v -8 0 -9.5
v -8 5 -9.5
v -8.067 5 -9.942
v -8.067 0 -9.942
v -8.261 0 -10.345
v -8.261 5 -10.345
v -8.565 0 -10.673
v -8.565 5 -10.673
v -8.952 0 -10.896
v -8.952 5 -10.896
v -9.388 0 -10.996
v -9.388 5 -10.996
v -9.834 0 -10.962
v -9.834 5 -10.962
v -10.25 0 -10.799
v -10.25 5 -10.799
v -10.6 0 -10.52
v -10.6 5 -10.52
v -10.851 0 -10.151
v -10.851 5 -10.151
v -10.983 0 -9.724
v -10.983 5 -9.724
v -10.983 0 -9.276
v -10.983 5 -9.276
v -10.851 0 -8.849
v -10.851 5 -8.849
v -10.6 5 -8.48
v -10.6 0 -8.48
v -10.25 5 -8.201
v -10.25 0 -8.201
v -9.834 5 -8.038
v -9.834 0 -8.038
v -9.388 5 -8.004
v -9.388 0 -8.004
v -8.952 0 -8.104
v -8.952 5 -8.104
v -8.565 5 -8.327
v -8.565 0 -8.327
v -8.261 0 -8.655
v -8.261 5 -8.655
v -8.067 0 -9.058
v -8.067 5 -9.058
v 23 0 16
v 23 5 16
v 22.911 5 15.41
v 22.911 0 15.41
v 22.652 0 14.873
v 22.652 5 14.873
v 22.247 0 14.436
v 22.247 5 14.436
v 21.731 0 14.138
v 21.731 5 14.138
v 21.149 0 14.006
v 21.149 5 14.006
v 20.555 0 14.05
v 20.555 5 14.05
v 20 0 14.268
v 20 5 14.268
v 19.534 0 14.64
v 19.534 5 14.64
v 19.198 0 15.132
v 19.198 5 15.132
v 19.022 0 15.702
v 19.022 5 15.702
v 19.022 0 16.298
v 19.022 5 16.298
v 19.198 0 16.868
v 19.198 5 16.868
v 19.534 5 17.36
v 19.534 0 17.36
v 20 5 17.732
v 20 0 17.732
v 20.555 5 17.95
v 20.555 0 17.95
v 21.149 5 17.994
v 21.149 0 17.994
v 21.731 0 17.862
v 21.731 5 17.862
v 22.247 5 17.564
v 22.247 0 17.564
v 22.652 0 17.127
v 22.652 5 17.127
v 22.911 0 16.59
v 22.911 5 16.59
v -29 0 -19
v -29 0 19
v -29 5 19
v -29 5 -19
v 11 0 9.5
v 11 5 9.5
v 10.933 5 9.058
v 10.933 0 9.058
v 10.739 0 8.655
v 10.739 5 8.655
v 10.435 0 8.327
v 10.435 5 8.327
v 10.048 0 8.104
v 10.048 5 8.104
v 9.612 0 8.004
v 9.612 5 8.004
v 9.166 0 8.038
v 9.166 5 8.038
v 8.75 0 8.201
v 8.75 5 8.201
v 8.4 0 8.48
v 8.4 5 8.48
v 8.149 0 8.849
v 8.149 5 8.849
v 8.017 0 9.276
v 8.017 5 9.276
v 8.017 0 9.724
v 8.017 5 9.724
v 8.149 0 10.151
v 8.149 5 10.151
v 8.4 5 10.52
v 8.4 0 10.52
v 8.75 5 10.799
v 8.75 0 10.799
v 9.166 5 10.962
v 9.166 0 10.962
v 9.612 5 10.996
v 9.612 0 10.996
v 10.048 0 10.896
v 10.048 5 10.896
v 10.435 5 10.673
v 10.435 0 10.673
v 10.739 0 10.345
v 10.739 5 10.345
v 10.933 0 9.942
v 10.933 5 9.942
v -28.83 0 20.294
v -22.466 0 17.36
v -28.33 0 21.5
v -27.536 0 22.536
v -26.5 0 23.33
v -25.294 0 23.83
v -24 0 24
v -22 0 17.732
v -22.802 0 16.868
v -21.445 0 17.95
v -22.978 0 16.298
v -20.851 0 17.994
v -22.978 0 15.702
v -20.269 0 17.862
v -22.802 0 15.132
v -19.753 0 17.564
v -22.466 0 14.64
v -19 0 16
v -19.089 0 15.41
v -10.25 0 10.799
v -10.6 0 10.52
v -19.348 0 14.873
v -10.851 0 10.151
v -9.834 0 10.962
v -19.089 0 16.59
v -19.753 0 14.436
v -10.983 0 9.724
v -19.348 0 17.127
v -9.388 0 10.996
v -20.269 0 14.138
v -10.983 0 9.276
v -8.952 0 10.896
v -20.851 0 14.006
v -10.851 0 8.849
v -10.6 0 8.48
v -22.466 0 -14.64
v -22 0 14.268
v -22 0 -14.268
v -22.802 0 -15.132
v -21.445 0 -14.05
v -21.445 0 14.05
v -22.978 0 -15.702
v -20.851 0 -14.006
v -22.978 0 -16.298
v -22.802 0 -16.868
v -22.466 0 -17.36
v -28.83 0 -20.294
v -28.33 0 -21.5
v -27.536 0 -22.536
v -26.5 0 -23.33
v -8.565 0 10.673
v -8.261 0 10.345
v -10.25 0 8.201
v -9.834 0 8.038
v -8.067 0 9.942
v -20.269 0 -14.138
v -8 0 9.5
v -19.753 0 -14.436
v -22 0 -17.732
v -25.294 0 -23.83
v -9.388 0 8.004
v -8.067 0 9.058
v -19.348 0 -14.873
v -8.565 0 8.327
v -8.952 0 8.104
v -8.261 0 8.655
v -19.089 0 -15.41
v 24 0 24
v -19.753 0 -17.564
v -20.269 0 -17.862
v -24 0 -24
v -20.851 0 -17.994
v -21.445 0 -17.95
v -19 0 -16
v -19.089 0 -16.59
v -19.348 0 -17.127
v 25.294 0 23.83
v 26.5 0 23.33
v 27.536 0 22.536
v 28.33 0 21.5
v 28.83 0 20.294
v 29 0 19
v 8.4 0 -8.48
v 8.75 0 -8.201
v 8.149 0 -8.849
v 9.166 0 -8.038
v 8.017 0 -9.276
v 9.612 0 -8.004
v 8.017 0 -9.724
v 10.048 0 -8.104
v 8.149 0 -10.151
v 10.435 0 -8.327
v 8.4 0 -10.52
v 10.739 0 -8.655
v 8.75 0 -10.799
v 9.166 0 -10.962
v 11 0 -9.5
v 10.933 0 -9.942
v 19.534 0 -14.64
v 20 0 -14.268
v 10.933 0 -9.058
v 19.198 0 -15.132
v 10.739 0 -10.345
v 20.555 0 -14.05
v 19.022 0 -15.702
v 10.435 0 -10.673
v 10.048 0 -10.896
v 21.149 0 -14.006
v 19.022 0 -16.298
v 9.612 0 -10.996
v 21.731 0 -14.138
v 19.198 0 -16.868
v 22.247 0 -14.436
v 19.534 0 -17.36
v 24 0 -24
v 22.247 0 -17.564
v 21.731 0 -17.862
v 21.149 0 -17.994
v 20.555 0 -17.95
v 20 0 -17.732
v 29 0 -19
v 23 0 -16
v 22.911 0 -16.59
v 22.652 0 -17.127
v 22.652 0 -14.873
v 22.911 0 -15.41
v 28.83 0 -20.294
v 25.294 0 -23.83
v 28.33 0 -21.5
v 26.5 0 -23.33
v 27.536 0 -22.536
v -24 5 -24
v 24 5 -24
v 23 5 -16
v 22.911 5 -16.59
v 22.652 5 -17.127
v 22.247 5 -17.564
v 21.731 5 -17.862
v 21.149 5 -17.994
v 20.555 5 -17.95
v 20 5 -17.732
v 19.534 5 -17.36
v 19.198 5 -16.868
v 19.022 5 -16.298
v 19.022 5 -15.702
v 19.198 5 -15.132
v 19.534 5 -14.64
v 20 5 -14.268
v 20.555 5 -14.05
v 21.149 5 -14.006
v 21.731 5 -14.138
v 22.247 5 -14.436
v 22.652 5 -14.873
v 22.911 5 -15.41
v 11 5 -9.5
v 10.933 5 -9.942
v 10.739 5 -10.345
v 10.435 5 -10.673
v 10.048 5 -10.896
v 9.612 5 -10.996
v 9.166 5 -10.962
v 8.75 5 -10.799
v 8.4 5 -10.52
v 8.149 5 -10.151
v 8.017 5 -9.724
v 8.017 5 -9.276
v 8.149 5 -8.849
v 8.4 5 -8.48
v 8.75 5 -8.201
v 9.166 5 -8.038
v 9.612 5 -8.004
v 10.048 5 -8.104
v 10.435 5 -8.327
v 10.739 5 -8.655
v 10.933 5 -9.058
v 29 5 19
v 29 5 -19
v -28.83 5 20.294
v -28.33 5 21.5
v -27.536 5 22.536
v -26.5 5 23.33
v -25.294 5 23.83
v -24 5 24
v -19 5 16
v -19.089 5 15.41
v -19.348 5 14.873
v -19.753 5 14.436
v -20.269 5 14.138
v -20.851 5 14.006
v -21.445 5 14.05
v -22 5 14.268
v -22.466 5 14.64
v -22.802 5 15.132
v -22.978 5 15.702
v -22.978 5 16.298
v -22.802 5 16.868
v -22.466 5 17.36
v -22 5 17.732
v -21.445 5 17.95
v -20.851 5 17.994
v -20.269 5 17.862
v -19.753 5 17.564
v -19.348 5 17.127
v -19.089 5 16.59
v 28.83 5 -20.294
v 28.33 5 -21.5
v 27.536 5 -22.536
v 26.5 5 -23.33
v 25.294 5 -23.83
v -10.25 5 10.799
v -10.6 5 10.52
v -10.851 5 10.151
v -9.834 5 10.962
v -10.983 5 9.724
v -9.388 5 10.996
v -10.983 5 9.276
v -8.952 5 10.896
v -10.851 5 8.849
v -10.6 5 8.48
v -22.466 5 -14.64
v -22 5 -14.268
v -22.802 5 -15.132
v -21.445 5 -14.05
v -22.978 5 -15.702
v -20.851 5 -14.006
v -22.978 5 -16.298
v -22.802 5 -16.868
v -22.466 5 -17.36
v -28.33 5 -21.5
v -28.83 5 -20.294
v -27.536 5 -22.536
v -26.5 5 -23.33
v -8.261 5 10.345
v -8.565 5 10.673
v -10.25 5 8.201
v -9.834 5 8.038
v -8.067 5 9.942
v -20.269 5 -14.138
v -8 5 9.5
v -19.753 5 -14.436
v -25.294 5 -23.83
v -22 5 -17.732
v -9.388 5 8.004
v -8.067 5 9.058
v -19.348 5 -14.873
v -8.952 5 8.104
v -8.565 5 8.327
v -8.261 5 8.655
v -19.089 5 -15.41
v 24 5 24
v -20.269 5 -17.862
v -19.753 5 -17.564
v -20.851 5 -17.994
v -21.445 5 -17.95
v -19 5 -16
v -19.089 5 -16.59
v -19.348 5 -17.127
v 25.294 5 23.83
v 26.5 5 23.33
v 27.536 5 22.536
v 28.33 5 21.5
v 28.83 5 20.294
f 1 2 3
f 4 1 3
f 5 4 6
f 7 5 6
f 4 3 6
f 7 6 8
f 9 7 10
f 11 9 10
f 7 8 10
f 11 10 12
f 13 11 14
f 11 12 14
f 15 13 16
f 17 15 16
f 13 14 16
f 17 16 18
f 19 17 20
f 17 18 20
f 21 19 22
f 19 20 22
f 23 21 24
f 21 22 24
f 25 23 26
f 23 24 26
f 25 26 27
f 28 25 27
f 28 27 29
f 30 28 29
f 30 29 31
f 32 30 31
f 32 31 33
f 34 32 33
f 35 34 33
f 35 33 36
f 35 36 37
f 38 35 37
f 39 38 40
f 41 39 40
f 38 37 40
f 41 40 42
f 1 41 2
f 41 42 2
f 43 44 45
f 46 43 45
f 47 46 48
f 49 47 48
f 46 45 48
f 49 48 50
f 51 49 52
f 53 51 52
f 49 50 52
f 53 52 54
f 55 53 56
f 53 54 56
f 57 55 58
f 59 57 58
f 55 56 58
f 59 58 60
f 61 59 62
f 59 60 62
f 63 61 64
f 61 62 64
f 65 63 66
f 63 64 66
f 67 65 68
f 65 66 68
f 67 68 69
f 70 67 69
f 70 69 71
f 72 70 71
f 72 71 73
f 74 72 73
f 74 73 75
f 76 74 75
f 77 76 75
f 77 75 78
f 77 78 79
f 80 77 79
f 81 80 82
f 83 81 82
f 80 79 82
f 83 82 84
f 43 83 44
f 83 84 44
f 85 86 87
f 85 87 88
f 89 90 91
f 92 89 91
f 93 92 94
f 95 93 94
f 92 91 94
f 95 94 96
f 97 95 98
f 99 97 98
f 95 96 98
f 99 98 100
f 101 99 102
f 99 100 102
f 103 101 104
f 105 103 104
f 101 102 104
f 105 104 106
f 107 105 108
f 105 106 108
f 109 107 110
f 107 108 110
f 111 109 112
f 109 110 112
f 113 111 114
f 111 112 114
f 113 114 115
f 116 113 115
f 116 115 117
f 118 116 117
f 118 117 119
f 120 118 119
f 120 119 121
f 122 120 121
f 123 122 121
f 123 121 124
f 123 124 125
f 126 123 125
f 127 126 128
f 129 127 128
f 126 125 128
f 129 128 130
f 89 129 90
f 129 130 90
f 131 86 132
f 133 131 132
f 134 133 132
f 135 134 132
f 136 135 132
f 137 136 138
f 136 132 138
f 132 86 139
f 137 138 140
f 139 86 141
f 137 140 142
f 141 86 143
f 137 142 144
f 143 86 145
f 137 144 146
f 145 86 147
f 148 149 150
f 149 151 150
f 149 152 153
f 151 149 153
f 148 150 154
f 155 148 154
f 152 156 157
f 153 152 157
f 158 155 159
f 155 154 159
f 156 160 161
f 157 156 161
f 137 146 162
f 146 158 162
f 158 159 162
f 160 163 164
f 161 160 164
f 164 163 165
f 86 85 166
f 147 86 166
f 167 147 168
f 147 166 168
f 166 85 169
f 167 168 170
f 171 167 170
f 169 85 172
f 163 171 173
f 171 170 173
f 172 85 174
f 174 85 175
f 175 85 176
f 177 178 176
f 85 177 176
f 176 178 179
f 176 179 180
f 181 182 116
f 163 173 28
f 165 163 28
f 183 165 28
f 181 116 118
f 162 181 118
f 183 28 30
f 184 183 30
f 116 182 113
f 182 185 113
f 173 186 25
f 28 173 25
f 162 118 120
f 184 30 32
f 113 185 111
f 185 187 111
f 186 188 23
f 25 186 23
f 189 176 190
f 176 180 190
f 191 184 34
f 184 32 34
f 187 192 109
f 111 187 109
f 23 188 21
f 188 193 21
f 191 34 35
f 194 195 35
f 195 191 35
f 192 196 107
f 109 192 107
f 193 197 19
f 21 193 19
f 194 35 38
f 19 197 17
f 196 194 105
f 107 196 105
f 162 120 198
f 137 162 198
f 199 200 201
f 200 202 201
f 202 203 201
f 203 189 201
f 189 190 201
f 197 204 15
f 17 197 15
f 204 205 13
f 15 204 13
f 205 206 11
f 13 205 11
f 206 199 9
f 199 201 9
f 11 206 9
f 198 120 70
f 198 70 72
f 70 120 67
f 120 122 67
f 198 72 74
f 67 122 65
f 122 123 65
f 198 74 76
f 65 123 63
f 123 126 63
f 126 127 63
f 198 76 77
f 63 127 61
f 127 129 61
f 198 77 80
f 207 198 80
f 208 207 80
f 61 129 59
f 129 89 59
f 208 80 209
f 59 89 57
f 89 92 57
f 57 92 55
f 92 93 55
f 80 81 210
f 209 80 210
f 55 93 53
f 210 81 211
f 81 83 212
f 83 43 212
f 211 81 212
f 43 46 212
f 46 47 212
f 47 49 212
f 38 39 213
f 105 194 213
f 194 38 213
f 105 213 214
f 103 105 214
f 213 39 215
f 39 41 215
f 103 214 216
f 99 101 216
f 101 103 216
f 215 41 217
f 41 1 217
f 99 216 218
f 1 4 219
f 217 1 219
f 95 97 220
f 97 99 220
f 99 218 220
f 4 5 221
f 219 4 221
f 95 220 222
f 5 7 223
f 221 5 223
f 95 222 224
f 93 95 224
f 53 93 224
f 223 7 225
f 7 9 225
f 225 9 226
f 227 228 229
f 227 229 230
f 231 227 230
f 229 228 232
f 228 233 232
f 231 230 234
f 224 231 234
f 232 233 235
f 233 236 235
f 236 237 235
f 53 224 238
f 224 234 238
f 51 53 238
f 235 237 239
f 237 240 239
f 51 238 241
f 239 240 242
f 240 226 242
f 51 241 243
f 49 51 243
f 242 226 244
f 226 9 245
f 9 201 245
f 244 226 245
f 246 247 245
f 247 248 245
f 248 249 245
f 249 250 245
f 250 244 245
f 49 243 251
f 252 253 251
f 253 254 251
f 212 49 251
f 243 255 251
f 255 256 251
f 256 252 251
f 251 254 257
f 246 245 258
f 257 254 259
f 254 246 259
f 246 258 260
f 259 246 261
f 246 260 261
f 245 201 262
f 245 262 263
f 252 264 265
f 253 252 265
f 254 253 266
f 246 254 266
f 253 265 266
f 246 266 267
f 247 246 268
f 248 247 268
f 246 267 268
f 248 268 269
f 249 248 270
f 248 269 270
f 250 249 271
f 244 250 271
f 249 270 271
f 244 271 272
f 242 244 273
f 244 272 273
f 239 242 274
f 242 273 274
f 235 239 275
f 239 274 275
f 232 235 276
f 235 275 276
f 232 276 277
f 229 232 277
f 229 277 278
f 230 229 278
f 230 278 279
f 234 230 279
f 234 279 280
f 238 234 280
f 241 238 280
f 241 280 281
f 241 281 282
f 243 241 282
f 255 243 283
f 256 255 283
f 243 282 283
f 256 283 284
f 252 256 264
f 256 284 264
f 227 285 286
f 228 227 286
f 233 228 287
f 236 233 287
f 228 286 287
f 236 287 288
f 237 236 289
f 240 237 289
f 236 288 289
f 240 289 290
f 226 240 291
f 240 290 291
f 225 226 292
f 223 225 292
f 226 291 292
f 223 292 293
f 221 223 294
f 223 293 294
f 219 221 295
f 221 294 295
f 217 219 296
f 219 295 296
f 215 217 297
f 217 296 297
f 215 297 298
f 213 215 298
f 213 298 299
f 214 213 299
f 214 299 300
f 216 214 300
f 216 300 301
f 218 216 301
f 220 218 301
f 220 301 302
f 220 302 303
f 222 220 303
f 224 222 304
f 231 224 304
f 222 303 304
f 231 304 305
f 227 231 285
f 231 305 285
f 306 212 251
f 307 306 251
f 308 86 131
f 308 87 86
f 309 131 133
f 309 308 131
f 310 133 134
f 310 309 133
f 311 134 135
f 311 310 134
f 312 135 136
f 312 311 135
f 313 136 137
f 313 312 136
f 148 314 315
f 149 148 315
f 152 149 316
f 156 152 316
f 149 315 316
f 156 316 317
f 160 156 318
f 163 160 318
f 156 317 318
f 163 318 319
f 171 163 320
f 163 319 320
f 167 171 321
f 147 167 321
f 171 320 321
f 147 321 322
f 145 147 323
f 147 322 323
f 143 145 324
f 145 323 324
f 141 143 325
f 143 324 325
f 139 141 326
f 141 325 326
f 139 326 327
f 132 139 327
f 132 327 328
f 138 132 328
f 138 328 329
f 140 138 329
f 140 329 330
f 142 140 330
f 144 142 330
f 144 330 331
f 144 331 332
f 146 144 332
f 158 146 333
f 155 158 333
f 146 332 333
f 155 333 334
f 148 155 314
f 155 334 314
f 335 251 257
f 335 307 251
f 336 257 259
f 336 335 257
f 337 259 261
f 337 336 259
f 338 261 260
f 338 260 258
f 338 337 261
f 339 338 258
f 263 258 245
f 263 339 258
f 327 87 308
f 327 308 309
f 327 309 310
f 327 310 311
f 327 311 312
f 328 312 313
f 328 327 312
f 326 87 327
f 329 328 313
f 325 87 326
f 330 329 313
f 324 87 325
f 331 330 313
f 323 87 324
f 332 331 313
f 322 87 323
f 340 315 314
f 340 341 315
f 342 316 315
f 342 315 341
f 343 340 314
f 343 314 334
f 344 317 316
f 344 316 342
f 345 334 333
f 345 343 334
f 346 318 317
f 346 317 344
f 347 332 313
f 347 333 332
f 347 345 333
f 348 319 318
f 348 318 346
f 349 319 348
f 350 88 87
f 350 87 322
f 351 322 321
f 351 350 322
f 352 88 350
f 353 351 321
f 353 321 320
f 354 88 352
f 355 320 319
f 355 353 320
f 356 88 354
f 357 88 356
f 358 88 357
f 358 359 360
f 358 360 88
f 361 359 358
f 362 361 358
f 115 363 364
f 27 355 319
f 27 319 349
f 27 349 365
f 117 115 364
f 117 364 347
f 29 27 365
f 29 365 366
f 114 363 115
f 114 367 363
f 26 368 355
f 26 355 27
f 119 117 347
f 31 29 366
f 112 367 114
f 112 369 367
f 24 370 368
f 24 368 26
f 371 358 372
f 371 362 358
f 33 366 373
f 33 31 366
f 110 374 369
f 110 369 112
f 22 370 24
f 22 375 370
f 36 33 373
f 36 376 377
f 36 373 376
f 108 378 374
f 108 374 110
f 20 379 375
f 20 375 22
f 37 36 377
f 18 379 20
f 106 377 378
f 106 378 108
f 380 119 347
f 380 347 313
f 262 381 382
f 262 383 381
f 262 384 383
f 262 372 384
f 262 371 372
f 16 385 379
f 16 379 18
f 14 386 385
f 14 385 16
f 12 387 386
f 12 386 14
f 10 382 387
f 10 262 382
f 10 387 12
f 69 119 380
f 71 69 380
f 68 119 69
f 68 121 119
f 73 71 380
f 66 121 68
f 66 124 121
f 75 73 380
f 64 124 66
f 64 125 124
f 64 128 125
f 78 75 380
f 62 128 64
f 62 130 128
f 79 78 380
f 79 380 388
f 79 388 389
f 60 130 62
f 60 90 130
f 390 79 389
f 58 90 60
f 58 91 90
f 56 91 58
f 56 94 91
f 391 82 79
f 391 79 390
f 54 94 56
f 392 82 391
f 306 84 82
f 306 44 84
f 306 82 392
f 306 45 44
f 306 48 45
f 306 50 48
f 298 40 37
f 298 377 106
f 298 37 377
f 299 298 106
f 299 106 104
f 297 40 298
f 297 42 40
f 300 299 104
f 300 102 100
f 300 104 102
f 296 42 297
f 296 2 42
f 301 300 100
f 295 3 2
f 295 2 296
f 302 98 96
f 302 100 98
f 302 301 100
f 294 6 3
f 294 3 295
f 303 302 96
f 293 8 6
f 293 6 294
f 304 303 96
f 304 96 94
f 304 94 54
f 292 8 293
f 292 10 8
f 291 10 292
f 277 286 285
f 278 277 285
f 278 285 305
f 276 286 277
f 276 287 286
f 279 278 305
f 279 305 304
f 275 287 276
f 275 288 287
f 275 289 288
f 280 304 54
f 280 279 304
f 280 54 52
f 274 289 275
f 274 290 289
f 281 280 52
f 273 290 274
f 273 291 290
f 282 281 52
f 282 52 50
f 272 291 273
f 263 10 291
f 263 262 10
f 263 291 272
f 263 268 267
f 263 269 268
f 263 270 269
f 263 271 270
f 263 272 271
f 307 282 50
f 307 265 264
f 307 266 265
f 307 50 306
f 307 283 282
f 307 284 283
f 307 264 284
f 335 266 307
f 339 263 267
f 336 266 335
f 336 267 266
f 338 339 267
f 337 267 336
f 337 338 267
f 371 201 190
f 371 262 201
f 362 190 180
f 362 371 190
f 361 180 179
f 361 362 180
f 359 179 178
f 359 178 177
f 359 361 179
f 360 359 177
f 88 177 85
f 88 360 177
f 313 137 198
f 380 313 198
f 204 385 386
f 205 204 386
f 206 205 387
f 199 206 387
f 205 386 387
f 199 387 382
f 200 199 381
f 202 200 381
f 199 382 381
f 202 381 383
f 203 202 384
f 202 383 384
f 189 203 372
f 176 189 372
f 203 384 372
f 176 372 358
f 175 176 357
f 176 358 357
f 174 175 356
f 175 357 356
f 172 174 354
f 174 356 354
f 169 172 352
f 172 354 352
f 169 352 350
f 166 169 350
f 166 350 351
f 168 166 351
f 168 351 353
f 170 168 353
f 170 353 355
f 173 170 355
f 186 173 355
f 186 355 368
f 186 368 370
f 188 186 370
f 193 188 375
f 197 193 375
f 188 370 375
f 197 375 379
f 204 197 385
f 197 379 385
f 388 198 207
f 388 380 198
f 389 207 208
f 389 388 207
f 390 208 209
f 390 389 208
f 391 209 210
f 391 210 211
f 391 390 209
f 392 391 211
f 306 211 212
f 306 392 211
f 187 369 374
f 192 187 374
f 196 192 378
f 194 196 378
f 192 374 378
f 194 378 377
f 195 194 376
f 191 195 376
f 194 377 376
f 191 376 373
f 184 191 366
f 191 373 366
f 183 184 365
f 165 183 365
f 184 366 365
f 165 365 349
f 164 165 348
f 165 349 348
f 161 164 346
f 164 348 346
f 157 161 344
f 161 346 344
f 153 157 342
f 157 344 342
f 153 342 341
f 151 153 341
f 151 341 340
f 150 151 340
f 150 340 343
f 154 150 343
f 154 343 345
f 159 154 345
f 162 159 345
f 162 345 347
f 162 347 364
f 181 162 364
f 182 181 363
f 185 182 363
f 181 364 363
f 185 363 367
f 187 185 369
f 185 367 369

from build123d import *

# Parameters (mm, degrees)
SKETCH1_W           = 58
SKETCH1_H           = 48
BOSS_EXTRUDE1_DEPTH = 5
SKETCH2_R           = 2
SKETCH2_R_2         = 1.5
CUT_EXTRUDE1_DEPTH  = 5
FILLET1_R           = 5
FILLET2_R           = 5
FILLET3_R           = 5
FILLET4_R           = 5


with BuildPart() as part:
    # Sketch1 → Boss-Extrude1 (new body)
    with BuildSketch(Plane(origin=(0, 0, 0), x_dir=(1, 0, 0), z_dir=(0, 1, 0))):
        Rectangle(SKETCH1_W, SKETCH1_H)
    extrude(amount=BOSS_EXTRUDE1_DEPTH)

    # Sketch2 → Cut-Extrude1 (cut)
    with BuildSketch(Plane(origin=(0, 5, 0), x_dir=(1, 0, 0), z_dir=(0, 1, 0))):
        with Locations((21, -16)):
            Circle(SKETCH2_R)
        with Locations((-21, -16)):
            Circle(SKETCH2_R)
        with Locations((-21, 16)):
            Circle(SKETCH2_R)
        with Locations((21, 16)):
            Circle(SKETCH2_R)
        with Locations((9.5, -9.5)):
            Circle(SKETCH2_R_2)
        with Locations((-9.5, -9.5)):
            Circle(SKETCH2_R_2)
        with Locations((9.5, 9.5)):
            Circle(SKETCH2_R_2)
        with Locations((-9.5, 9.5)):
            Circle(SKETCH2_R_2)
    extrude(amount=-CUT_EXTRUDE1_DEPTH, mode=Mode.SUBTRACT)

    # Fillet1
    fillet1_edges = [part.edges().sort_by_distance(p)[0] for p in [
        (-29, 2.5, 24),
    ]]
    fillet(fillet1_edges, radius=FILLET1_R)

    # Fillet2
    fillet2_edges = [part.edges().sort_by_distance(p)[0] for p in [
        (29, 2.5, 24),
    ]]
    fillet(fillet2_edges, radius=FILLET2_R)

    # Fillet3
    fillet3_edges = [part.edges().sort_by_distance(p)[0] for p in [
        (29, 2.5, -24),
    ]]
    fillet(fillet3_edges, radius=FILLET3_R)

    # Fillet4
    fillet4_edges = [part.edges().sort_by_distance(p)[0] for p in [
        (-29, 2.5, -24),
    ]]
    fillet(fillet4_edges, radius=FILLET4_R)


solid = part.part
